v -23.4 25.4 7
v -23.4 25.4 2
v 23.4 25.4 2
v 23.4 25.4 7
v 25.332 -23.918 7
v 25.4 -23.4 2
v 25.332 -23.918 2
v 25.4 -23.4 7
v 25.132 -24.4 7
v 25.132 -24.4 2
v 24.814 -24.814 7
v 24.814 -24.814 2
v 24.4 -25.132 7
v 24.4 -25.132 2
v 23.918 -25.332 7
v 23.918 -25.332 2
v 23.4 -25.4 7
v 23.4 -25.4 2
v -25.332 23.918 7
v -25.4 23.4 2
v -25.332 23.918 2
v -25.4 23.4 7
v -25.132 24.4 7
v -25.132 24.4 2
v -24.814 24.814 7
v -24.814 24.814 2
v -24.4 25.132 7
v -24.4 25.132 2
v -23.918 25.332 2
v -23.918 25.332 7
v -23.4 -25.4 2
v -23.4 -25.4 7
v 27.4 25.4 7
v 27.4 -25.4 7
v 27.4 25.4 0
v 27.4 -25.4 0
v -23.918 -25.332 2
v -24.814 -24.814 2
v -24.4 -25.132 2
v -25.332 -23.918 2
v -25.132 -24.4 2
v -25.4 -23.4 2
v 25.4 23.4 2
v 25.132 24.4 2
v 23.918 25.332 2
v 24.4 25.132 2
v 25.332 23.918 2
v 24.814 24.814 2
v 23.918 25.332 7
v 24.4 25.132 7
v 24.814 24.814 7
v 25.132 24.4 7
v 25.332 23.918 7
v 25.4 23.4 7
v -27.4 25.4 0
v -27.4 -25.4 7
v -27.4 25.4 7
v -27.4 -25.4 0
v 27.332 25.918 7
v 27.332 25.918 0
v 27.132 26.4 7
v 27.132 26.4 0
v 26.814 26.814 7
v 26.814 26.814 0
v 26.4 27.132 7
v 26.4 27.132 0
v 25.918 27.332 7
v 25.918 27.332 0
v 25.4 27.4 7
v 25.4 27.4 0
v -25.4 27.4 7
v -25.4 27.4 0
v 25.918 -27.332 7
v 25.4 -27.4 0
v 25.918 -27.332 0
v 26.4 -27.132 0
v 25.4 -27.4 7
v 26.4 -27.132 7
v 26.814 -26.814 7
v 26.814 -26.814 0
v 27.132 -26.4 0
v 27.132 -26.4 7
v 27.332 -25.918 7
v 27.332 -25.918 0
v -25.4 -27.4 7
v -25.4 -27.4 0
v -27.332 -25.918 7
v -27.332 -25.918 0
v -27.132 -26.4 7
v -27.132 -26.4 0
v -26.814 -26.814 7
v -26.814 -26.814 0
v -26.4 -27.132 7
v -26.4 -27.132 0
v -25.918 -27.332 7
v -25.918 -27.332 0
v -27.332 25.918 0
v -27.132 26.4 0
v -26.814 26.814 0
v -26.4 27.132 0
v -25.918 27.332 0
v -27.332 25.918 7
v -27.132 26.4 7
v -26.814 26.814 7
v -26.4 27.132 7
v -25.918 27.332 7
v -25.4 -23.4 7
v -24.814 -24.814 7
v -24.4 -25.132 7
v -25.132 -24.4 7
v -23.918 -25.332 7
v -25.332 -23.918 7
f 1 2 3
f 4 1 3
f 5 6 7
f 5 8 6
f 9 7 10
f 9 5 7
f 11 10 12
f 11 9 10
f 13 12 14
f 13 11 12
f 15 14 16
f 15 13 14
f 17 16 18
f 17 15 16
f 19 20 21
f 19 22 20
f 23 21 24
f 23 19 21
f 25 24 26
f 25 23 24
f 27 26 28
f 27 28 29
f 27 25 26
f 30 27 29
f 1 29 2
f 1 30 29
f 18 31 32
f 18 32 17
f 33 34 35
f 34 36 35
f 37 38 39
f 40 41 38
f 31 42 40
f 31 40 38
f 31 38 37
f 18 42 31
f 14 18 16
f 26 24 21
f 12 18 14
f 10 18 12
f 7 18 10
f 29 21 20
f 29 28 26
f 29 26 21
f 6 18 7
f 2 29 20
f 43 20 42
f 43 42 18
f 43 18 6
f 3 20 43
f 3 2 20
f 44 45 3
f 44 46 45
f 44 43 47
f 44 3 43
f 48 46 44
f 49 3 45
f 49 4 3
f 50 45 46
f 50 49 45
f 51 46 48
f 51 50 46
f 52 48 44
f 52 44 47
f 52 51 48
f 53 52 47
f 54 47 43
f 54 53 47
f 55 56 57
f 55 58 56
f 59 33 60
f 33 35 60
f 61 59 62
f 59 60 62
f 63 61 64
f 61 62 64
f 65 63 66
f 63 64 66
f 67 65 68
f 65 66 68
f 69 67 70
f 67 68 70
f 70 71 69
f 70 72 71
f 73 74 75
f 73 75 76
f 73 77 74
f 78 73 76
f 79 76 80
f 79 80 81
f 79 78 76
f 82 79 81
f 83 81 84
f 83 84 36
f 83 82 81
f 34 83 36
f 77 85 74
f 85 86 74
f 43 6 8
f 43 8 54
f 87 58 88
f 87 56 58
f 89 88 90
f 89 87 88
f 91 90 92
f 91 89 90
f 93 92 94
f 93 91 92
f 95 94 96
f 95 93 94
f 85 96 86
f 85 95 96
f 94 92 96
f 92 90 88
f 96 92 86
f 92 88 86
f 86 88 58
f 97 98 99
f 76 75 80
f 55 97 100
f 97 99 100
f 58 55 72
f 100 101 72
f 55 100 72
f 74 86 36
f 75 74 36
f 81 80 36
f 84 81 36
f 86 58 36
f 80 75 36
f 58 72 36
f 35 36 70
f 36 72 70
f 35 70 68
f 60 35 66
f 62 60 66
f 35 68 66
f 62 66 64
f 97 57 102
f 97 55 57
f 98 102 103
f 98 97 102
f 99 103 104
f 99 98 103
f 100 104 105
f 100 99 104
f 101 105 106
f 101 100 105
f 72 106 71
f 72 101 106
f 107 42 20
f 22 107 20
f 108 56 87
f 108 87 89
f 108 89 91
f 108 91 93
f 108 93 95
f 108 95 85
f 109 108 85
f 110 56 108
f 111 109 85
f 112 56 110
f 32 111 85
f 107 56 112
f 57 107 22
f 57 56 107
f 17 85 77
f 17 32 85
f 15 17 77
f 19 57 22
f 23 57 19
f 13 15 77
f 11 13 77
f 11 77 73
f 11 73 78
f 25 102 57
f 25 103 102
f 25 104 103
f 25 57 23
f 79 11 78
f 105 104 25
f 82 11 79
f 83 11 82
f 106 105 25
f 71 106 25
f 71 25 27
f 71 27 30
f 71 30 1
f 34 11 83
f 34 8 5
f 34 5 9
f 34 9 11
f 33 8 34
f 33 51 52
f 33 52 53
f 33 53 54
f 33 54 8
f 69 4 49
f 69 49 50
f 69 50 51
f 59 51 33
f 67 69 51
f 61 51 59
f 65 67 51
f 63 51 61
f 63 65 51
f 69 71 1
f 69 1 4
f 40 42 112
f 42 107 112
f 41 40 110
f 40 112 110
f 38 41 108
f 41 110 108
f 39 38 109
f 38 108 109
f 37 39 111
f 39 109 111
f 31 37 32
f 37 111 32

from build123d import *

# Parameters (mm, degrees)
SKETCH1_W           = 54.8
SKETCH1_H           = 54.8
SKETCH1_W_2         = 50.8
SKETCH1_H_2         = 50.8
BOSS_EXTRUDE1_DEPTH = 2
SKETCH2_W           = 54.8
SKETCH2_H           = 54.8
SKETCH2_W_2         = 50.8
SKETCH2_H_2         = 50.8
BOSS_EXTRUDE2_DEPTH = 5
FILLET1_R           = 2


with BuildPart() as part:
    # Sketch1 → Boss-Extrude1 (new body)
    # profile 1 of 2: a face of its own
    with BuildSketch(Plane.XY):
        Rectangle(SKETCH1_W, SKETCH1_H)
        Rectangle(SKETCH1_W_2, SKETCH1_H_2, mode=Mode.SUBTRACT)
    # profile 2 of 2: a face of its own
    with BuildSketch(Plane.XY):
        Rectangle(SKETCH1_W_2, SKETCH1_H_2)
    extrude(amount=BOSS_EXTRUDE1_DEPTH)

    # Sketch2 → Boss-Extrude2 (add)
    with BuildSketch(Plane.XY.offset(2)):
        Rectangle(SKETCH2_W, SKETCH2_H)
        Rectangle(SKETCH2_W_2, SKETCH2_H_2, mode=Mode.SUBTRACT)
    extrude(amount=BOSS_EXTRUDE2_DEPTH)

    # Fillet1
    fillet1_edges = [part.edges().sort_by_distance(p)[0] for p in [
        (-25.4, -25.4, 4.5),
        (25.4, -25.4, 4.5),
        (25.4, 25.4, 4.5),
        (-25.4, 25.4, 4.5),
        (27.4, 27.4, 3.5),
        (27.4, -27.4, 3.5),
        (-27.4, -27.4, 3.5),
        (-27.4, 27.4, 3.5),
    ]]
    fillet(fillet1_edges, radius=FILLET1_R)


solid = part.part
